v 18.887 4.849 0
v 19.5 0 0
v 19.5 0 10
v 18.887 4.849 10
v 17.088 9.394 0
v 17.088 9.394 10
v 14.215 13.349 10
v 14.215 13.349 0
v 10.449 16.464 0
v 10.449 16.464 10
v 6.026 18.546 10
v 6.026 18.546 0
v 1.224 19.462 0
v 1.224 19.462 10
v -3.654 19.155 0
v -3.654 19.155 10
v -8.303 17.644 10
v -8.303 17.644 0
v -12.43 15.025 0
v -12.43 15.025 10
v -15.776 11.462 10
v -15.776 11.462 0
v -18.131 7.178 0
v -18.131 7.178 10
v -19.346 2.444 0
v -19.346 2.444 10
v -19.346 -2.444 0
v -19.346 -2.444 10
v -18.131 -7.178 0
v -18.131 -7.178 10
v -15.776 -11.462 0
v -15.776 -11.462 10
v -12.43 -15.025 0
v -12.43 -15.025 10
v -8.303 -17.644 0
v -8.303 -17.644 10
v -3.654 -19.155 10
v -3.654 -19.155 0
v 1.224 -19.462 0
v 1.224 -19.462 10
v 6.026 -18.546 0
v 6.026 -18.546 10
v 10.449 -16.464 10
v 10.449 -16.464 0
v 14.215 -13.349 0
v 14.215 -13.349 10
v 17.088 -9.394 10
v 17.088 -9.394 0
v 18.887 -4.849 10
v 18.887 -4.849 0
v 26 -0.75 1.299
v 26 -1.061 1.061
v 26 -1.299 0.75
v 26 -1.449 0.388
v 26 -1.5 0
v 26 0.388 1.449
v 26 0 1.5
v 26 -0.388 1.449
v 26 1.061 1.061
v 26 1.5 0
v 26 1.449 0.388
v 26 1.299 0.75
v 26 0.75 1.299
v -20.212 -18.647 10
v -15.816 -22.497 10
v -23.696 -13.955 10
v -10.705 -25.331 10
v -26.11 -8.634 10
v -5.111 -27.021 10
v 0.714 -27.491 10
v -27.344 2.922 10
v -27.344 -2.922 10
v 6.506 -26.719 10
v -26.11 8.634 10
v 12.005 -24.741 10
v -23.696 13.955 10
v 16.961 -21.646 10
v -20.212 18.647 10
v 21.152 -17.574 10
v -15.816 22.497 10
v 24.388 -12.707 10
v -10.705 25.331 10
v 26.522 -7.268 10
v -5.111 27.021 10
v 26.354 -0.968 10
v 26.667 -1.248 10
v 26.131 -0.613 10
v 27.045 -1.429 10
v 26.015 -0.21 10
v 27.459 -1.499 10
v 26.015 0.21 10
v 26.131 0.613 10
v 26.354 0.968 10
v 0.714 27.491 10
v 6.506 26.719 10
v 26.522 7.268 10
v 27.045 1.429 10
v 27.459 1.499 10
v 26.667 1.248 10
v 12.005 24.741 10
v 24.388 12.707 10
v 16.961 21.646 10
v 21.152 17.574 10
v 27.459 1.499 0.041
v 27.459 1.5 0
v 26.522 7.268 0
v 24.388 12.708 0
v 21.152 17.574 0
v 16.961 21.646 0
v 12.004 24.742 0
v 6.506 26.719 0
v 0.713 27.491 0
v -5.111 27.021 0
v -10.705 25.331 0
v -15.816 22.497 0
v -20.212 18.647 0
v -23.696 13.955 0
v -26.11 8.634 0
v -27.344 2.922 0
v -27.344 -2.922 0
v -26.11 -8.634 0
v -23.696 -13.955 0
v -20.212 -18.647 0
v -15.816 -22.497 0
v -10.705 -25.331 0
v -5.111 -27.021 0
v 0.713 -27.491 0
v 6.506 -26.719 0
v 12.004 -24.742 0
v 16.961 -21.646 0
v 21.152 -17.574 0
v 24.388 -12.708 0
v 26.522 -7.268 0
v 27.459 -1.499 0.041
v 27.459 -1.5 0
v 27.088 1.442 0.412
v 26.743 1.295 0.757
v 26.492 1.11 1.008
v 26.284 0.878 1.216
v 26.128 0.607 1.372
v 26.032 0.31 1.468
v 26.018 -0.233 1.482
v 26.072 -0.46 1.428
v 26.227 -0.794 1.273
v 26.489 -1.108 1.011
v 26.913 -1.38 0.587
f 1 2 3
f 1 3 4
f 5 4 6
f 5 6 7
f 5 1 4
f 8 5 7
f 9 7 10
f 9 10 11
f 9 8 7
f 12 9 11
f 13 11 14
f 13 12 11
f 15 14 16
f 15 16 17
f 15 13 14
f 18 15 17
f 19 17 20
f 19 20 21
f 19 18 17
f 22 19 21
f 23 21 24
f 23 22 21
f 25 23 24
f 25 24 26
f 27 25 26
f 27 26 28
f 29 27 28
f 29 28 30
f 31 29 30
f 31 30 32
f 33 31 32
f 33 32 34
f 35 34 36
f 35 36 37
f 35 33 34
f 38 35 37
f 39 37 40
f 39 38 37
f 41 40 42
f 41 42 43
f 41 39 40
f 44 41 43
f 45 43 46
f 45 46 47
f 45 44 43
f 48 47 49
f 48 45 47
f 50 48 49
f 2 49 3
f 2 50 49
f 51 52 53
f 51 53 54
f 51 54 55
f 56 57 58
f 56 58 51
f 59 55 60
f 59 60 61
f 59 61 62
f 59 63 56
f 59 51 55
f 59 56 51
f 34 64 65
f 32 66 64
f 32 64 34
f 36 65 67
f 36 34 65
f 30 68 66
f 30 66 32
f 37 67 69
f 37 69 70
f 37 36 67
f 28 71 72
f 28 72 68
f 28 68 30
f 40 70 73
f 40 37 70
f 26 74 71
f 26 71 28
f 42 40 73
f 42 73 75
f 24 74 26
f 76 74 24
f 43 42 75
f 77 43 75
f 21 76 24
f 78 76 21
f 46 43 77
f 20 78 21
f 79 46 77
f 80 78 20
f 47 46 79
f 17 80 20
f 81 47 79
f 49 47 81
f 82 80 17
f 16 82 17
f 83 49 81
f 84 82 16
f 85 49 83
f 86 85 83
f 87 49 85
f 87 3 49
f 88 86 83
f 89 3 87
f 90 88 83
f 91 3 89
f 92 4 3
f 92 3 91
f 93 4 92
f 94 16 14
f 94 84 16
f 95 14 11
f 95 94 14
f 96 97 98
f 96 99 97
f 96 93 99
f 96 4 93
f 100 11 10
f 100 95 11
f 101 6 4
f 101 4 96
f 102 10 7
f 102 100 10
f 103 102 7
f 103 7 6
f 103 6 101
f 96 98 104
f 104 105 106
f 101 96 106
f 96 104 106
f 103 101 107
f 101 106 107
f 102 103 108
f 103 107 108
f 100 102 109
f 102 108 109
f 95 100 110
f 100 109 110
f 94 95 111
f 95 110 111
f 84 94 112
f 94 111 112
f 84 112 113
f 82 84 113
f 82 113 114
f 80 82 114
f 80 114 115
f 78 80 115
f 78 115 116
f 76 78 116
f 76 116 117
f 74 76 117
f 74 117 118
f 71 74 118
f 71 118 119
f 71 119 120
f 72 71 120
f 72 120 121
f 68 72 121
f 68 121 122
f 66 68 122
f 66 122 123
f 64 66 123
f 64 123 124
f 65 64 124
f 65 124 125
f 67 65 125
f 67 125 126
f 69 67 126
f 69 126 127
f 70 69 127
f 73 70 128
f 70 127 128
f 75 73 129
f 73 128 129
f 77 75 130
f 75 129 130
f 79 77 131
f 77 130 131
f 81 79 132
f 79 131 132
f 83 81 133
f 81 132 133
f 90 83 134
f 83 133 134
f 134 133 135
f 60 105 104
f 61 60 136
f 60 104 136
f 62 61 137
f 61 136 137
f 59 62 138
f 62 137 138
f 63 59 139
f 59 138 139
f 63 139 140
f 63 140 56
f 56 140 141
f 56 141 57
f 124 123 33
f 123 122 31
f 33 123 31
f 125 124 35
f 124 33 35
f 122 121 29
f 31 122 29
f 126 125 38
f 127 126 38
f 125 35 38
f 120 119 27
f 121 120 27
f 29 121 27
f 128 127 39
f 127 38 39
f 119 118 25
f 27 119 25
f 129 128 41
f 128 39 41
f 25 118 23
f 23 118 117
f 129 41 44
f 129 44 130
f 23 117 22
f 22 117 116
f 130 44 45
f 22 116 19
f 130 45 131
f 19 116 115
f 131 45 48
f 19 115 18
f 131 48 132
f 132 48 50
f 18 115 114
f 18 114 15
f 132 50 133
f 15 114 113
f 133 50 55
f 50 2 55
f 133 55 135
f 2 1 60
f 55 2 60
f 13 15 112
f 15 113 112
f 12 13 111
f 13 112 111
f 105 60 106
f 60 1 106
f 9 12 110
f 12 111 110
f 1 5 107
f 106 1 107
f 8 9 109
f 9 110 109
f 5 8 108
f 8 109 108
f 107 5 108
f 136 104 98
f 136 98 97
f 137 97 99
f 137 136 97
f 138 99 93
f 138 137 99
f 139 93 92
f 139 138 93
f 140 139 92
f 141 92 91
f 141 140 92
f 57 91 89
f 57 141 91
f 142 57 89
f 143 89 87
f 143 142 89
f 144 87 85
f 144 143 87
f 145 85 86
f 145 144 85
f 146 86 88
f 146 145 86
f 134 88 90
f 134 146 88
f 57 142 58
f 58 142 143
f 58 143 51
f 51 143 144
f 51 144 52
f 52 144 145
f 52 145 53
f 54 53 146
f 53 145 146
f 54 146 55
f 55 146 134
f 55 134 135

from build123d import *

# Parameters (mm, degrees)
SKETCH_R        = 27.5
SKETCH_R_2      = 19.5
PAD_DEPTH       = 10
SKETCH001_R     = 1.5
POCKET_DEPTH    = 10
SKETCH002_R     = 1.5
POCKET001_DEPTH = 1.5


with BuildPart() as part:
    # Sketch → Pad (new body)
    with BuildSketch(Plane.XY):
        Circle(SKETCH_R)
        Circle(SKETCH_R_2, mode=Mode.SUBTRACT)
    extrude(amount=PAD_DEPTH)

    # Sketch001 → Pocket (cut)
    with BuildSketch(Plane(origin=(27.5, 0, 0), x_dir=(1, 0, 0), z_dir=(0, 0, 1))):
        Circle(SKETCH001_R)
    extrude(amount=POCKET_DEPTH, mode=Mode.SUBTRACT)

    # Sketch002 → Pocket001 (cut)
    with BuildSketch(Plane.YZ.offset(27.5)):
        Circle(SKETCH002_R)
    extrude(amount=-POCKET001_DEPTH, mode=Mode.SUBTRACT)


solid = part.part
